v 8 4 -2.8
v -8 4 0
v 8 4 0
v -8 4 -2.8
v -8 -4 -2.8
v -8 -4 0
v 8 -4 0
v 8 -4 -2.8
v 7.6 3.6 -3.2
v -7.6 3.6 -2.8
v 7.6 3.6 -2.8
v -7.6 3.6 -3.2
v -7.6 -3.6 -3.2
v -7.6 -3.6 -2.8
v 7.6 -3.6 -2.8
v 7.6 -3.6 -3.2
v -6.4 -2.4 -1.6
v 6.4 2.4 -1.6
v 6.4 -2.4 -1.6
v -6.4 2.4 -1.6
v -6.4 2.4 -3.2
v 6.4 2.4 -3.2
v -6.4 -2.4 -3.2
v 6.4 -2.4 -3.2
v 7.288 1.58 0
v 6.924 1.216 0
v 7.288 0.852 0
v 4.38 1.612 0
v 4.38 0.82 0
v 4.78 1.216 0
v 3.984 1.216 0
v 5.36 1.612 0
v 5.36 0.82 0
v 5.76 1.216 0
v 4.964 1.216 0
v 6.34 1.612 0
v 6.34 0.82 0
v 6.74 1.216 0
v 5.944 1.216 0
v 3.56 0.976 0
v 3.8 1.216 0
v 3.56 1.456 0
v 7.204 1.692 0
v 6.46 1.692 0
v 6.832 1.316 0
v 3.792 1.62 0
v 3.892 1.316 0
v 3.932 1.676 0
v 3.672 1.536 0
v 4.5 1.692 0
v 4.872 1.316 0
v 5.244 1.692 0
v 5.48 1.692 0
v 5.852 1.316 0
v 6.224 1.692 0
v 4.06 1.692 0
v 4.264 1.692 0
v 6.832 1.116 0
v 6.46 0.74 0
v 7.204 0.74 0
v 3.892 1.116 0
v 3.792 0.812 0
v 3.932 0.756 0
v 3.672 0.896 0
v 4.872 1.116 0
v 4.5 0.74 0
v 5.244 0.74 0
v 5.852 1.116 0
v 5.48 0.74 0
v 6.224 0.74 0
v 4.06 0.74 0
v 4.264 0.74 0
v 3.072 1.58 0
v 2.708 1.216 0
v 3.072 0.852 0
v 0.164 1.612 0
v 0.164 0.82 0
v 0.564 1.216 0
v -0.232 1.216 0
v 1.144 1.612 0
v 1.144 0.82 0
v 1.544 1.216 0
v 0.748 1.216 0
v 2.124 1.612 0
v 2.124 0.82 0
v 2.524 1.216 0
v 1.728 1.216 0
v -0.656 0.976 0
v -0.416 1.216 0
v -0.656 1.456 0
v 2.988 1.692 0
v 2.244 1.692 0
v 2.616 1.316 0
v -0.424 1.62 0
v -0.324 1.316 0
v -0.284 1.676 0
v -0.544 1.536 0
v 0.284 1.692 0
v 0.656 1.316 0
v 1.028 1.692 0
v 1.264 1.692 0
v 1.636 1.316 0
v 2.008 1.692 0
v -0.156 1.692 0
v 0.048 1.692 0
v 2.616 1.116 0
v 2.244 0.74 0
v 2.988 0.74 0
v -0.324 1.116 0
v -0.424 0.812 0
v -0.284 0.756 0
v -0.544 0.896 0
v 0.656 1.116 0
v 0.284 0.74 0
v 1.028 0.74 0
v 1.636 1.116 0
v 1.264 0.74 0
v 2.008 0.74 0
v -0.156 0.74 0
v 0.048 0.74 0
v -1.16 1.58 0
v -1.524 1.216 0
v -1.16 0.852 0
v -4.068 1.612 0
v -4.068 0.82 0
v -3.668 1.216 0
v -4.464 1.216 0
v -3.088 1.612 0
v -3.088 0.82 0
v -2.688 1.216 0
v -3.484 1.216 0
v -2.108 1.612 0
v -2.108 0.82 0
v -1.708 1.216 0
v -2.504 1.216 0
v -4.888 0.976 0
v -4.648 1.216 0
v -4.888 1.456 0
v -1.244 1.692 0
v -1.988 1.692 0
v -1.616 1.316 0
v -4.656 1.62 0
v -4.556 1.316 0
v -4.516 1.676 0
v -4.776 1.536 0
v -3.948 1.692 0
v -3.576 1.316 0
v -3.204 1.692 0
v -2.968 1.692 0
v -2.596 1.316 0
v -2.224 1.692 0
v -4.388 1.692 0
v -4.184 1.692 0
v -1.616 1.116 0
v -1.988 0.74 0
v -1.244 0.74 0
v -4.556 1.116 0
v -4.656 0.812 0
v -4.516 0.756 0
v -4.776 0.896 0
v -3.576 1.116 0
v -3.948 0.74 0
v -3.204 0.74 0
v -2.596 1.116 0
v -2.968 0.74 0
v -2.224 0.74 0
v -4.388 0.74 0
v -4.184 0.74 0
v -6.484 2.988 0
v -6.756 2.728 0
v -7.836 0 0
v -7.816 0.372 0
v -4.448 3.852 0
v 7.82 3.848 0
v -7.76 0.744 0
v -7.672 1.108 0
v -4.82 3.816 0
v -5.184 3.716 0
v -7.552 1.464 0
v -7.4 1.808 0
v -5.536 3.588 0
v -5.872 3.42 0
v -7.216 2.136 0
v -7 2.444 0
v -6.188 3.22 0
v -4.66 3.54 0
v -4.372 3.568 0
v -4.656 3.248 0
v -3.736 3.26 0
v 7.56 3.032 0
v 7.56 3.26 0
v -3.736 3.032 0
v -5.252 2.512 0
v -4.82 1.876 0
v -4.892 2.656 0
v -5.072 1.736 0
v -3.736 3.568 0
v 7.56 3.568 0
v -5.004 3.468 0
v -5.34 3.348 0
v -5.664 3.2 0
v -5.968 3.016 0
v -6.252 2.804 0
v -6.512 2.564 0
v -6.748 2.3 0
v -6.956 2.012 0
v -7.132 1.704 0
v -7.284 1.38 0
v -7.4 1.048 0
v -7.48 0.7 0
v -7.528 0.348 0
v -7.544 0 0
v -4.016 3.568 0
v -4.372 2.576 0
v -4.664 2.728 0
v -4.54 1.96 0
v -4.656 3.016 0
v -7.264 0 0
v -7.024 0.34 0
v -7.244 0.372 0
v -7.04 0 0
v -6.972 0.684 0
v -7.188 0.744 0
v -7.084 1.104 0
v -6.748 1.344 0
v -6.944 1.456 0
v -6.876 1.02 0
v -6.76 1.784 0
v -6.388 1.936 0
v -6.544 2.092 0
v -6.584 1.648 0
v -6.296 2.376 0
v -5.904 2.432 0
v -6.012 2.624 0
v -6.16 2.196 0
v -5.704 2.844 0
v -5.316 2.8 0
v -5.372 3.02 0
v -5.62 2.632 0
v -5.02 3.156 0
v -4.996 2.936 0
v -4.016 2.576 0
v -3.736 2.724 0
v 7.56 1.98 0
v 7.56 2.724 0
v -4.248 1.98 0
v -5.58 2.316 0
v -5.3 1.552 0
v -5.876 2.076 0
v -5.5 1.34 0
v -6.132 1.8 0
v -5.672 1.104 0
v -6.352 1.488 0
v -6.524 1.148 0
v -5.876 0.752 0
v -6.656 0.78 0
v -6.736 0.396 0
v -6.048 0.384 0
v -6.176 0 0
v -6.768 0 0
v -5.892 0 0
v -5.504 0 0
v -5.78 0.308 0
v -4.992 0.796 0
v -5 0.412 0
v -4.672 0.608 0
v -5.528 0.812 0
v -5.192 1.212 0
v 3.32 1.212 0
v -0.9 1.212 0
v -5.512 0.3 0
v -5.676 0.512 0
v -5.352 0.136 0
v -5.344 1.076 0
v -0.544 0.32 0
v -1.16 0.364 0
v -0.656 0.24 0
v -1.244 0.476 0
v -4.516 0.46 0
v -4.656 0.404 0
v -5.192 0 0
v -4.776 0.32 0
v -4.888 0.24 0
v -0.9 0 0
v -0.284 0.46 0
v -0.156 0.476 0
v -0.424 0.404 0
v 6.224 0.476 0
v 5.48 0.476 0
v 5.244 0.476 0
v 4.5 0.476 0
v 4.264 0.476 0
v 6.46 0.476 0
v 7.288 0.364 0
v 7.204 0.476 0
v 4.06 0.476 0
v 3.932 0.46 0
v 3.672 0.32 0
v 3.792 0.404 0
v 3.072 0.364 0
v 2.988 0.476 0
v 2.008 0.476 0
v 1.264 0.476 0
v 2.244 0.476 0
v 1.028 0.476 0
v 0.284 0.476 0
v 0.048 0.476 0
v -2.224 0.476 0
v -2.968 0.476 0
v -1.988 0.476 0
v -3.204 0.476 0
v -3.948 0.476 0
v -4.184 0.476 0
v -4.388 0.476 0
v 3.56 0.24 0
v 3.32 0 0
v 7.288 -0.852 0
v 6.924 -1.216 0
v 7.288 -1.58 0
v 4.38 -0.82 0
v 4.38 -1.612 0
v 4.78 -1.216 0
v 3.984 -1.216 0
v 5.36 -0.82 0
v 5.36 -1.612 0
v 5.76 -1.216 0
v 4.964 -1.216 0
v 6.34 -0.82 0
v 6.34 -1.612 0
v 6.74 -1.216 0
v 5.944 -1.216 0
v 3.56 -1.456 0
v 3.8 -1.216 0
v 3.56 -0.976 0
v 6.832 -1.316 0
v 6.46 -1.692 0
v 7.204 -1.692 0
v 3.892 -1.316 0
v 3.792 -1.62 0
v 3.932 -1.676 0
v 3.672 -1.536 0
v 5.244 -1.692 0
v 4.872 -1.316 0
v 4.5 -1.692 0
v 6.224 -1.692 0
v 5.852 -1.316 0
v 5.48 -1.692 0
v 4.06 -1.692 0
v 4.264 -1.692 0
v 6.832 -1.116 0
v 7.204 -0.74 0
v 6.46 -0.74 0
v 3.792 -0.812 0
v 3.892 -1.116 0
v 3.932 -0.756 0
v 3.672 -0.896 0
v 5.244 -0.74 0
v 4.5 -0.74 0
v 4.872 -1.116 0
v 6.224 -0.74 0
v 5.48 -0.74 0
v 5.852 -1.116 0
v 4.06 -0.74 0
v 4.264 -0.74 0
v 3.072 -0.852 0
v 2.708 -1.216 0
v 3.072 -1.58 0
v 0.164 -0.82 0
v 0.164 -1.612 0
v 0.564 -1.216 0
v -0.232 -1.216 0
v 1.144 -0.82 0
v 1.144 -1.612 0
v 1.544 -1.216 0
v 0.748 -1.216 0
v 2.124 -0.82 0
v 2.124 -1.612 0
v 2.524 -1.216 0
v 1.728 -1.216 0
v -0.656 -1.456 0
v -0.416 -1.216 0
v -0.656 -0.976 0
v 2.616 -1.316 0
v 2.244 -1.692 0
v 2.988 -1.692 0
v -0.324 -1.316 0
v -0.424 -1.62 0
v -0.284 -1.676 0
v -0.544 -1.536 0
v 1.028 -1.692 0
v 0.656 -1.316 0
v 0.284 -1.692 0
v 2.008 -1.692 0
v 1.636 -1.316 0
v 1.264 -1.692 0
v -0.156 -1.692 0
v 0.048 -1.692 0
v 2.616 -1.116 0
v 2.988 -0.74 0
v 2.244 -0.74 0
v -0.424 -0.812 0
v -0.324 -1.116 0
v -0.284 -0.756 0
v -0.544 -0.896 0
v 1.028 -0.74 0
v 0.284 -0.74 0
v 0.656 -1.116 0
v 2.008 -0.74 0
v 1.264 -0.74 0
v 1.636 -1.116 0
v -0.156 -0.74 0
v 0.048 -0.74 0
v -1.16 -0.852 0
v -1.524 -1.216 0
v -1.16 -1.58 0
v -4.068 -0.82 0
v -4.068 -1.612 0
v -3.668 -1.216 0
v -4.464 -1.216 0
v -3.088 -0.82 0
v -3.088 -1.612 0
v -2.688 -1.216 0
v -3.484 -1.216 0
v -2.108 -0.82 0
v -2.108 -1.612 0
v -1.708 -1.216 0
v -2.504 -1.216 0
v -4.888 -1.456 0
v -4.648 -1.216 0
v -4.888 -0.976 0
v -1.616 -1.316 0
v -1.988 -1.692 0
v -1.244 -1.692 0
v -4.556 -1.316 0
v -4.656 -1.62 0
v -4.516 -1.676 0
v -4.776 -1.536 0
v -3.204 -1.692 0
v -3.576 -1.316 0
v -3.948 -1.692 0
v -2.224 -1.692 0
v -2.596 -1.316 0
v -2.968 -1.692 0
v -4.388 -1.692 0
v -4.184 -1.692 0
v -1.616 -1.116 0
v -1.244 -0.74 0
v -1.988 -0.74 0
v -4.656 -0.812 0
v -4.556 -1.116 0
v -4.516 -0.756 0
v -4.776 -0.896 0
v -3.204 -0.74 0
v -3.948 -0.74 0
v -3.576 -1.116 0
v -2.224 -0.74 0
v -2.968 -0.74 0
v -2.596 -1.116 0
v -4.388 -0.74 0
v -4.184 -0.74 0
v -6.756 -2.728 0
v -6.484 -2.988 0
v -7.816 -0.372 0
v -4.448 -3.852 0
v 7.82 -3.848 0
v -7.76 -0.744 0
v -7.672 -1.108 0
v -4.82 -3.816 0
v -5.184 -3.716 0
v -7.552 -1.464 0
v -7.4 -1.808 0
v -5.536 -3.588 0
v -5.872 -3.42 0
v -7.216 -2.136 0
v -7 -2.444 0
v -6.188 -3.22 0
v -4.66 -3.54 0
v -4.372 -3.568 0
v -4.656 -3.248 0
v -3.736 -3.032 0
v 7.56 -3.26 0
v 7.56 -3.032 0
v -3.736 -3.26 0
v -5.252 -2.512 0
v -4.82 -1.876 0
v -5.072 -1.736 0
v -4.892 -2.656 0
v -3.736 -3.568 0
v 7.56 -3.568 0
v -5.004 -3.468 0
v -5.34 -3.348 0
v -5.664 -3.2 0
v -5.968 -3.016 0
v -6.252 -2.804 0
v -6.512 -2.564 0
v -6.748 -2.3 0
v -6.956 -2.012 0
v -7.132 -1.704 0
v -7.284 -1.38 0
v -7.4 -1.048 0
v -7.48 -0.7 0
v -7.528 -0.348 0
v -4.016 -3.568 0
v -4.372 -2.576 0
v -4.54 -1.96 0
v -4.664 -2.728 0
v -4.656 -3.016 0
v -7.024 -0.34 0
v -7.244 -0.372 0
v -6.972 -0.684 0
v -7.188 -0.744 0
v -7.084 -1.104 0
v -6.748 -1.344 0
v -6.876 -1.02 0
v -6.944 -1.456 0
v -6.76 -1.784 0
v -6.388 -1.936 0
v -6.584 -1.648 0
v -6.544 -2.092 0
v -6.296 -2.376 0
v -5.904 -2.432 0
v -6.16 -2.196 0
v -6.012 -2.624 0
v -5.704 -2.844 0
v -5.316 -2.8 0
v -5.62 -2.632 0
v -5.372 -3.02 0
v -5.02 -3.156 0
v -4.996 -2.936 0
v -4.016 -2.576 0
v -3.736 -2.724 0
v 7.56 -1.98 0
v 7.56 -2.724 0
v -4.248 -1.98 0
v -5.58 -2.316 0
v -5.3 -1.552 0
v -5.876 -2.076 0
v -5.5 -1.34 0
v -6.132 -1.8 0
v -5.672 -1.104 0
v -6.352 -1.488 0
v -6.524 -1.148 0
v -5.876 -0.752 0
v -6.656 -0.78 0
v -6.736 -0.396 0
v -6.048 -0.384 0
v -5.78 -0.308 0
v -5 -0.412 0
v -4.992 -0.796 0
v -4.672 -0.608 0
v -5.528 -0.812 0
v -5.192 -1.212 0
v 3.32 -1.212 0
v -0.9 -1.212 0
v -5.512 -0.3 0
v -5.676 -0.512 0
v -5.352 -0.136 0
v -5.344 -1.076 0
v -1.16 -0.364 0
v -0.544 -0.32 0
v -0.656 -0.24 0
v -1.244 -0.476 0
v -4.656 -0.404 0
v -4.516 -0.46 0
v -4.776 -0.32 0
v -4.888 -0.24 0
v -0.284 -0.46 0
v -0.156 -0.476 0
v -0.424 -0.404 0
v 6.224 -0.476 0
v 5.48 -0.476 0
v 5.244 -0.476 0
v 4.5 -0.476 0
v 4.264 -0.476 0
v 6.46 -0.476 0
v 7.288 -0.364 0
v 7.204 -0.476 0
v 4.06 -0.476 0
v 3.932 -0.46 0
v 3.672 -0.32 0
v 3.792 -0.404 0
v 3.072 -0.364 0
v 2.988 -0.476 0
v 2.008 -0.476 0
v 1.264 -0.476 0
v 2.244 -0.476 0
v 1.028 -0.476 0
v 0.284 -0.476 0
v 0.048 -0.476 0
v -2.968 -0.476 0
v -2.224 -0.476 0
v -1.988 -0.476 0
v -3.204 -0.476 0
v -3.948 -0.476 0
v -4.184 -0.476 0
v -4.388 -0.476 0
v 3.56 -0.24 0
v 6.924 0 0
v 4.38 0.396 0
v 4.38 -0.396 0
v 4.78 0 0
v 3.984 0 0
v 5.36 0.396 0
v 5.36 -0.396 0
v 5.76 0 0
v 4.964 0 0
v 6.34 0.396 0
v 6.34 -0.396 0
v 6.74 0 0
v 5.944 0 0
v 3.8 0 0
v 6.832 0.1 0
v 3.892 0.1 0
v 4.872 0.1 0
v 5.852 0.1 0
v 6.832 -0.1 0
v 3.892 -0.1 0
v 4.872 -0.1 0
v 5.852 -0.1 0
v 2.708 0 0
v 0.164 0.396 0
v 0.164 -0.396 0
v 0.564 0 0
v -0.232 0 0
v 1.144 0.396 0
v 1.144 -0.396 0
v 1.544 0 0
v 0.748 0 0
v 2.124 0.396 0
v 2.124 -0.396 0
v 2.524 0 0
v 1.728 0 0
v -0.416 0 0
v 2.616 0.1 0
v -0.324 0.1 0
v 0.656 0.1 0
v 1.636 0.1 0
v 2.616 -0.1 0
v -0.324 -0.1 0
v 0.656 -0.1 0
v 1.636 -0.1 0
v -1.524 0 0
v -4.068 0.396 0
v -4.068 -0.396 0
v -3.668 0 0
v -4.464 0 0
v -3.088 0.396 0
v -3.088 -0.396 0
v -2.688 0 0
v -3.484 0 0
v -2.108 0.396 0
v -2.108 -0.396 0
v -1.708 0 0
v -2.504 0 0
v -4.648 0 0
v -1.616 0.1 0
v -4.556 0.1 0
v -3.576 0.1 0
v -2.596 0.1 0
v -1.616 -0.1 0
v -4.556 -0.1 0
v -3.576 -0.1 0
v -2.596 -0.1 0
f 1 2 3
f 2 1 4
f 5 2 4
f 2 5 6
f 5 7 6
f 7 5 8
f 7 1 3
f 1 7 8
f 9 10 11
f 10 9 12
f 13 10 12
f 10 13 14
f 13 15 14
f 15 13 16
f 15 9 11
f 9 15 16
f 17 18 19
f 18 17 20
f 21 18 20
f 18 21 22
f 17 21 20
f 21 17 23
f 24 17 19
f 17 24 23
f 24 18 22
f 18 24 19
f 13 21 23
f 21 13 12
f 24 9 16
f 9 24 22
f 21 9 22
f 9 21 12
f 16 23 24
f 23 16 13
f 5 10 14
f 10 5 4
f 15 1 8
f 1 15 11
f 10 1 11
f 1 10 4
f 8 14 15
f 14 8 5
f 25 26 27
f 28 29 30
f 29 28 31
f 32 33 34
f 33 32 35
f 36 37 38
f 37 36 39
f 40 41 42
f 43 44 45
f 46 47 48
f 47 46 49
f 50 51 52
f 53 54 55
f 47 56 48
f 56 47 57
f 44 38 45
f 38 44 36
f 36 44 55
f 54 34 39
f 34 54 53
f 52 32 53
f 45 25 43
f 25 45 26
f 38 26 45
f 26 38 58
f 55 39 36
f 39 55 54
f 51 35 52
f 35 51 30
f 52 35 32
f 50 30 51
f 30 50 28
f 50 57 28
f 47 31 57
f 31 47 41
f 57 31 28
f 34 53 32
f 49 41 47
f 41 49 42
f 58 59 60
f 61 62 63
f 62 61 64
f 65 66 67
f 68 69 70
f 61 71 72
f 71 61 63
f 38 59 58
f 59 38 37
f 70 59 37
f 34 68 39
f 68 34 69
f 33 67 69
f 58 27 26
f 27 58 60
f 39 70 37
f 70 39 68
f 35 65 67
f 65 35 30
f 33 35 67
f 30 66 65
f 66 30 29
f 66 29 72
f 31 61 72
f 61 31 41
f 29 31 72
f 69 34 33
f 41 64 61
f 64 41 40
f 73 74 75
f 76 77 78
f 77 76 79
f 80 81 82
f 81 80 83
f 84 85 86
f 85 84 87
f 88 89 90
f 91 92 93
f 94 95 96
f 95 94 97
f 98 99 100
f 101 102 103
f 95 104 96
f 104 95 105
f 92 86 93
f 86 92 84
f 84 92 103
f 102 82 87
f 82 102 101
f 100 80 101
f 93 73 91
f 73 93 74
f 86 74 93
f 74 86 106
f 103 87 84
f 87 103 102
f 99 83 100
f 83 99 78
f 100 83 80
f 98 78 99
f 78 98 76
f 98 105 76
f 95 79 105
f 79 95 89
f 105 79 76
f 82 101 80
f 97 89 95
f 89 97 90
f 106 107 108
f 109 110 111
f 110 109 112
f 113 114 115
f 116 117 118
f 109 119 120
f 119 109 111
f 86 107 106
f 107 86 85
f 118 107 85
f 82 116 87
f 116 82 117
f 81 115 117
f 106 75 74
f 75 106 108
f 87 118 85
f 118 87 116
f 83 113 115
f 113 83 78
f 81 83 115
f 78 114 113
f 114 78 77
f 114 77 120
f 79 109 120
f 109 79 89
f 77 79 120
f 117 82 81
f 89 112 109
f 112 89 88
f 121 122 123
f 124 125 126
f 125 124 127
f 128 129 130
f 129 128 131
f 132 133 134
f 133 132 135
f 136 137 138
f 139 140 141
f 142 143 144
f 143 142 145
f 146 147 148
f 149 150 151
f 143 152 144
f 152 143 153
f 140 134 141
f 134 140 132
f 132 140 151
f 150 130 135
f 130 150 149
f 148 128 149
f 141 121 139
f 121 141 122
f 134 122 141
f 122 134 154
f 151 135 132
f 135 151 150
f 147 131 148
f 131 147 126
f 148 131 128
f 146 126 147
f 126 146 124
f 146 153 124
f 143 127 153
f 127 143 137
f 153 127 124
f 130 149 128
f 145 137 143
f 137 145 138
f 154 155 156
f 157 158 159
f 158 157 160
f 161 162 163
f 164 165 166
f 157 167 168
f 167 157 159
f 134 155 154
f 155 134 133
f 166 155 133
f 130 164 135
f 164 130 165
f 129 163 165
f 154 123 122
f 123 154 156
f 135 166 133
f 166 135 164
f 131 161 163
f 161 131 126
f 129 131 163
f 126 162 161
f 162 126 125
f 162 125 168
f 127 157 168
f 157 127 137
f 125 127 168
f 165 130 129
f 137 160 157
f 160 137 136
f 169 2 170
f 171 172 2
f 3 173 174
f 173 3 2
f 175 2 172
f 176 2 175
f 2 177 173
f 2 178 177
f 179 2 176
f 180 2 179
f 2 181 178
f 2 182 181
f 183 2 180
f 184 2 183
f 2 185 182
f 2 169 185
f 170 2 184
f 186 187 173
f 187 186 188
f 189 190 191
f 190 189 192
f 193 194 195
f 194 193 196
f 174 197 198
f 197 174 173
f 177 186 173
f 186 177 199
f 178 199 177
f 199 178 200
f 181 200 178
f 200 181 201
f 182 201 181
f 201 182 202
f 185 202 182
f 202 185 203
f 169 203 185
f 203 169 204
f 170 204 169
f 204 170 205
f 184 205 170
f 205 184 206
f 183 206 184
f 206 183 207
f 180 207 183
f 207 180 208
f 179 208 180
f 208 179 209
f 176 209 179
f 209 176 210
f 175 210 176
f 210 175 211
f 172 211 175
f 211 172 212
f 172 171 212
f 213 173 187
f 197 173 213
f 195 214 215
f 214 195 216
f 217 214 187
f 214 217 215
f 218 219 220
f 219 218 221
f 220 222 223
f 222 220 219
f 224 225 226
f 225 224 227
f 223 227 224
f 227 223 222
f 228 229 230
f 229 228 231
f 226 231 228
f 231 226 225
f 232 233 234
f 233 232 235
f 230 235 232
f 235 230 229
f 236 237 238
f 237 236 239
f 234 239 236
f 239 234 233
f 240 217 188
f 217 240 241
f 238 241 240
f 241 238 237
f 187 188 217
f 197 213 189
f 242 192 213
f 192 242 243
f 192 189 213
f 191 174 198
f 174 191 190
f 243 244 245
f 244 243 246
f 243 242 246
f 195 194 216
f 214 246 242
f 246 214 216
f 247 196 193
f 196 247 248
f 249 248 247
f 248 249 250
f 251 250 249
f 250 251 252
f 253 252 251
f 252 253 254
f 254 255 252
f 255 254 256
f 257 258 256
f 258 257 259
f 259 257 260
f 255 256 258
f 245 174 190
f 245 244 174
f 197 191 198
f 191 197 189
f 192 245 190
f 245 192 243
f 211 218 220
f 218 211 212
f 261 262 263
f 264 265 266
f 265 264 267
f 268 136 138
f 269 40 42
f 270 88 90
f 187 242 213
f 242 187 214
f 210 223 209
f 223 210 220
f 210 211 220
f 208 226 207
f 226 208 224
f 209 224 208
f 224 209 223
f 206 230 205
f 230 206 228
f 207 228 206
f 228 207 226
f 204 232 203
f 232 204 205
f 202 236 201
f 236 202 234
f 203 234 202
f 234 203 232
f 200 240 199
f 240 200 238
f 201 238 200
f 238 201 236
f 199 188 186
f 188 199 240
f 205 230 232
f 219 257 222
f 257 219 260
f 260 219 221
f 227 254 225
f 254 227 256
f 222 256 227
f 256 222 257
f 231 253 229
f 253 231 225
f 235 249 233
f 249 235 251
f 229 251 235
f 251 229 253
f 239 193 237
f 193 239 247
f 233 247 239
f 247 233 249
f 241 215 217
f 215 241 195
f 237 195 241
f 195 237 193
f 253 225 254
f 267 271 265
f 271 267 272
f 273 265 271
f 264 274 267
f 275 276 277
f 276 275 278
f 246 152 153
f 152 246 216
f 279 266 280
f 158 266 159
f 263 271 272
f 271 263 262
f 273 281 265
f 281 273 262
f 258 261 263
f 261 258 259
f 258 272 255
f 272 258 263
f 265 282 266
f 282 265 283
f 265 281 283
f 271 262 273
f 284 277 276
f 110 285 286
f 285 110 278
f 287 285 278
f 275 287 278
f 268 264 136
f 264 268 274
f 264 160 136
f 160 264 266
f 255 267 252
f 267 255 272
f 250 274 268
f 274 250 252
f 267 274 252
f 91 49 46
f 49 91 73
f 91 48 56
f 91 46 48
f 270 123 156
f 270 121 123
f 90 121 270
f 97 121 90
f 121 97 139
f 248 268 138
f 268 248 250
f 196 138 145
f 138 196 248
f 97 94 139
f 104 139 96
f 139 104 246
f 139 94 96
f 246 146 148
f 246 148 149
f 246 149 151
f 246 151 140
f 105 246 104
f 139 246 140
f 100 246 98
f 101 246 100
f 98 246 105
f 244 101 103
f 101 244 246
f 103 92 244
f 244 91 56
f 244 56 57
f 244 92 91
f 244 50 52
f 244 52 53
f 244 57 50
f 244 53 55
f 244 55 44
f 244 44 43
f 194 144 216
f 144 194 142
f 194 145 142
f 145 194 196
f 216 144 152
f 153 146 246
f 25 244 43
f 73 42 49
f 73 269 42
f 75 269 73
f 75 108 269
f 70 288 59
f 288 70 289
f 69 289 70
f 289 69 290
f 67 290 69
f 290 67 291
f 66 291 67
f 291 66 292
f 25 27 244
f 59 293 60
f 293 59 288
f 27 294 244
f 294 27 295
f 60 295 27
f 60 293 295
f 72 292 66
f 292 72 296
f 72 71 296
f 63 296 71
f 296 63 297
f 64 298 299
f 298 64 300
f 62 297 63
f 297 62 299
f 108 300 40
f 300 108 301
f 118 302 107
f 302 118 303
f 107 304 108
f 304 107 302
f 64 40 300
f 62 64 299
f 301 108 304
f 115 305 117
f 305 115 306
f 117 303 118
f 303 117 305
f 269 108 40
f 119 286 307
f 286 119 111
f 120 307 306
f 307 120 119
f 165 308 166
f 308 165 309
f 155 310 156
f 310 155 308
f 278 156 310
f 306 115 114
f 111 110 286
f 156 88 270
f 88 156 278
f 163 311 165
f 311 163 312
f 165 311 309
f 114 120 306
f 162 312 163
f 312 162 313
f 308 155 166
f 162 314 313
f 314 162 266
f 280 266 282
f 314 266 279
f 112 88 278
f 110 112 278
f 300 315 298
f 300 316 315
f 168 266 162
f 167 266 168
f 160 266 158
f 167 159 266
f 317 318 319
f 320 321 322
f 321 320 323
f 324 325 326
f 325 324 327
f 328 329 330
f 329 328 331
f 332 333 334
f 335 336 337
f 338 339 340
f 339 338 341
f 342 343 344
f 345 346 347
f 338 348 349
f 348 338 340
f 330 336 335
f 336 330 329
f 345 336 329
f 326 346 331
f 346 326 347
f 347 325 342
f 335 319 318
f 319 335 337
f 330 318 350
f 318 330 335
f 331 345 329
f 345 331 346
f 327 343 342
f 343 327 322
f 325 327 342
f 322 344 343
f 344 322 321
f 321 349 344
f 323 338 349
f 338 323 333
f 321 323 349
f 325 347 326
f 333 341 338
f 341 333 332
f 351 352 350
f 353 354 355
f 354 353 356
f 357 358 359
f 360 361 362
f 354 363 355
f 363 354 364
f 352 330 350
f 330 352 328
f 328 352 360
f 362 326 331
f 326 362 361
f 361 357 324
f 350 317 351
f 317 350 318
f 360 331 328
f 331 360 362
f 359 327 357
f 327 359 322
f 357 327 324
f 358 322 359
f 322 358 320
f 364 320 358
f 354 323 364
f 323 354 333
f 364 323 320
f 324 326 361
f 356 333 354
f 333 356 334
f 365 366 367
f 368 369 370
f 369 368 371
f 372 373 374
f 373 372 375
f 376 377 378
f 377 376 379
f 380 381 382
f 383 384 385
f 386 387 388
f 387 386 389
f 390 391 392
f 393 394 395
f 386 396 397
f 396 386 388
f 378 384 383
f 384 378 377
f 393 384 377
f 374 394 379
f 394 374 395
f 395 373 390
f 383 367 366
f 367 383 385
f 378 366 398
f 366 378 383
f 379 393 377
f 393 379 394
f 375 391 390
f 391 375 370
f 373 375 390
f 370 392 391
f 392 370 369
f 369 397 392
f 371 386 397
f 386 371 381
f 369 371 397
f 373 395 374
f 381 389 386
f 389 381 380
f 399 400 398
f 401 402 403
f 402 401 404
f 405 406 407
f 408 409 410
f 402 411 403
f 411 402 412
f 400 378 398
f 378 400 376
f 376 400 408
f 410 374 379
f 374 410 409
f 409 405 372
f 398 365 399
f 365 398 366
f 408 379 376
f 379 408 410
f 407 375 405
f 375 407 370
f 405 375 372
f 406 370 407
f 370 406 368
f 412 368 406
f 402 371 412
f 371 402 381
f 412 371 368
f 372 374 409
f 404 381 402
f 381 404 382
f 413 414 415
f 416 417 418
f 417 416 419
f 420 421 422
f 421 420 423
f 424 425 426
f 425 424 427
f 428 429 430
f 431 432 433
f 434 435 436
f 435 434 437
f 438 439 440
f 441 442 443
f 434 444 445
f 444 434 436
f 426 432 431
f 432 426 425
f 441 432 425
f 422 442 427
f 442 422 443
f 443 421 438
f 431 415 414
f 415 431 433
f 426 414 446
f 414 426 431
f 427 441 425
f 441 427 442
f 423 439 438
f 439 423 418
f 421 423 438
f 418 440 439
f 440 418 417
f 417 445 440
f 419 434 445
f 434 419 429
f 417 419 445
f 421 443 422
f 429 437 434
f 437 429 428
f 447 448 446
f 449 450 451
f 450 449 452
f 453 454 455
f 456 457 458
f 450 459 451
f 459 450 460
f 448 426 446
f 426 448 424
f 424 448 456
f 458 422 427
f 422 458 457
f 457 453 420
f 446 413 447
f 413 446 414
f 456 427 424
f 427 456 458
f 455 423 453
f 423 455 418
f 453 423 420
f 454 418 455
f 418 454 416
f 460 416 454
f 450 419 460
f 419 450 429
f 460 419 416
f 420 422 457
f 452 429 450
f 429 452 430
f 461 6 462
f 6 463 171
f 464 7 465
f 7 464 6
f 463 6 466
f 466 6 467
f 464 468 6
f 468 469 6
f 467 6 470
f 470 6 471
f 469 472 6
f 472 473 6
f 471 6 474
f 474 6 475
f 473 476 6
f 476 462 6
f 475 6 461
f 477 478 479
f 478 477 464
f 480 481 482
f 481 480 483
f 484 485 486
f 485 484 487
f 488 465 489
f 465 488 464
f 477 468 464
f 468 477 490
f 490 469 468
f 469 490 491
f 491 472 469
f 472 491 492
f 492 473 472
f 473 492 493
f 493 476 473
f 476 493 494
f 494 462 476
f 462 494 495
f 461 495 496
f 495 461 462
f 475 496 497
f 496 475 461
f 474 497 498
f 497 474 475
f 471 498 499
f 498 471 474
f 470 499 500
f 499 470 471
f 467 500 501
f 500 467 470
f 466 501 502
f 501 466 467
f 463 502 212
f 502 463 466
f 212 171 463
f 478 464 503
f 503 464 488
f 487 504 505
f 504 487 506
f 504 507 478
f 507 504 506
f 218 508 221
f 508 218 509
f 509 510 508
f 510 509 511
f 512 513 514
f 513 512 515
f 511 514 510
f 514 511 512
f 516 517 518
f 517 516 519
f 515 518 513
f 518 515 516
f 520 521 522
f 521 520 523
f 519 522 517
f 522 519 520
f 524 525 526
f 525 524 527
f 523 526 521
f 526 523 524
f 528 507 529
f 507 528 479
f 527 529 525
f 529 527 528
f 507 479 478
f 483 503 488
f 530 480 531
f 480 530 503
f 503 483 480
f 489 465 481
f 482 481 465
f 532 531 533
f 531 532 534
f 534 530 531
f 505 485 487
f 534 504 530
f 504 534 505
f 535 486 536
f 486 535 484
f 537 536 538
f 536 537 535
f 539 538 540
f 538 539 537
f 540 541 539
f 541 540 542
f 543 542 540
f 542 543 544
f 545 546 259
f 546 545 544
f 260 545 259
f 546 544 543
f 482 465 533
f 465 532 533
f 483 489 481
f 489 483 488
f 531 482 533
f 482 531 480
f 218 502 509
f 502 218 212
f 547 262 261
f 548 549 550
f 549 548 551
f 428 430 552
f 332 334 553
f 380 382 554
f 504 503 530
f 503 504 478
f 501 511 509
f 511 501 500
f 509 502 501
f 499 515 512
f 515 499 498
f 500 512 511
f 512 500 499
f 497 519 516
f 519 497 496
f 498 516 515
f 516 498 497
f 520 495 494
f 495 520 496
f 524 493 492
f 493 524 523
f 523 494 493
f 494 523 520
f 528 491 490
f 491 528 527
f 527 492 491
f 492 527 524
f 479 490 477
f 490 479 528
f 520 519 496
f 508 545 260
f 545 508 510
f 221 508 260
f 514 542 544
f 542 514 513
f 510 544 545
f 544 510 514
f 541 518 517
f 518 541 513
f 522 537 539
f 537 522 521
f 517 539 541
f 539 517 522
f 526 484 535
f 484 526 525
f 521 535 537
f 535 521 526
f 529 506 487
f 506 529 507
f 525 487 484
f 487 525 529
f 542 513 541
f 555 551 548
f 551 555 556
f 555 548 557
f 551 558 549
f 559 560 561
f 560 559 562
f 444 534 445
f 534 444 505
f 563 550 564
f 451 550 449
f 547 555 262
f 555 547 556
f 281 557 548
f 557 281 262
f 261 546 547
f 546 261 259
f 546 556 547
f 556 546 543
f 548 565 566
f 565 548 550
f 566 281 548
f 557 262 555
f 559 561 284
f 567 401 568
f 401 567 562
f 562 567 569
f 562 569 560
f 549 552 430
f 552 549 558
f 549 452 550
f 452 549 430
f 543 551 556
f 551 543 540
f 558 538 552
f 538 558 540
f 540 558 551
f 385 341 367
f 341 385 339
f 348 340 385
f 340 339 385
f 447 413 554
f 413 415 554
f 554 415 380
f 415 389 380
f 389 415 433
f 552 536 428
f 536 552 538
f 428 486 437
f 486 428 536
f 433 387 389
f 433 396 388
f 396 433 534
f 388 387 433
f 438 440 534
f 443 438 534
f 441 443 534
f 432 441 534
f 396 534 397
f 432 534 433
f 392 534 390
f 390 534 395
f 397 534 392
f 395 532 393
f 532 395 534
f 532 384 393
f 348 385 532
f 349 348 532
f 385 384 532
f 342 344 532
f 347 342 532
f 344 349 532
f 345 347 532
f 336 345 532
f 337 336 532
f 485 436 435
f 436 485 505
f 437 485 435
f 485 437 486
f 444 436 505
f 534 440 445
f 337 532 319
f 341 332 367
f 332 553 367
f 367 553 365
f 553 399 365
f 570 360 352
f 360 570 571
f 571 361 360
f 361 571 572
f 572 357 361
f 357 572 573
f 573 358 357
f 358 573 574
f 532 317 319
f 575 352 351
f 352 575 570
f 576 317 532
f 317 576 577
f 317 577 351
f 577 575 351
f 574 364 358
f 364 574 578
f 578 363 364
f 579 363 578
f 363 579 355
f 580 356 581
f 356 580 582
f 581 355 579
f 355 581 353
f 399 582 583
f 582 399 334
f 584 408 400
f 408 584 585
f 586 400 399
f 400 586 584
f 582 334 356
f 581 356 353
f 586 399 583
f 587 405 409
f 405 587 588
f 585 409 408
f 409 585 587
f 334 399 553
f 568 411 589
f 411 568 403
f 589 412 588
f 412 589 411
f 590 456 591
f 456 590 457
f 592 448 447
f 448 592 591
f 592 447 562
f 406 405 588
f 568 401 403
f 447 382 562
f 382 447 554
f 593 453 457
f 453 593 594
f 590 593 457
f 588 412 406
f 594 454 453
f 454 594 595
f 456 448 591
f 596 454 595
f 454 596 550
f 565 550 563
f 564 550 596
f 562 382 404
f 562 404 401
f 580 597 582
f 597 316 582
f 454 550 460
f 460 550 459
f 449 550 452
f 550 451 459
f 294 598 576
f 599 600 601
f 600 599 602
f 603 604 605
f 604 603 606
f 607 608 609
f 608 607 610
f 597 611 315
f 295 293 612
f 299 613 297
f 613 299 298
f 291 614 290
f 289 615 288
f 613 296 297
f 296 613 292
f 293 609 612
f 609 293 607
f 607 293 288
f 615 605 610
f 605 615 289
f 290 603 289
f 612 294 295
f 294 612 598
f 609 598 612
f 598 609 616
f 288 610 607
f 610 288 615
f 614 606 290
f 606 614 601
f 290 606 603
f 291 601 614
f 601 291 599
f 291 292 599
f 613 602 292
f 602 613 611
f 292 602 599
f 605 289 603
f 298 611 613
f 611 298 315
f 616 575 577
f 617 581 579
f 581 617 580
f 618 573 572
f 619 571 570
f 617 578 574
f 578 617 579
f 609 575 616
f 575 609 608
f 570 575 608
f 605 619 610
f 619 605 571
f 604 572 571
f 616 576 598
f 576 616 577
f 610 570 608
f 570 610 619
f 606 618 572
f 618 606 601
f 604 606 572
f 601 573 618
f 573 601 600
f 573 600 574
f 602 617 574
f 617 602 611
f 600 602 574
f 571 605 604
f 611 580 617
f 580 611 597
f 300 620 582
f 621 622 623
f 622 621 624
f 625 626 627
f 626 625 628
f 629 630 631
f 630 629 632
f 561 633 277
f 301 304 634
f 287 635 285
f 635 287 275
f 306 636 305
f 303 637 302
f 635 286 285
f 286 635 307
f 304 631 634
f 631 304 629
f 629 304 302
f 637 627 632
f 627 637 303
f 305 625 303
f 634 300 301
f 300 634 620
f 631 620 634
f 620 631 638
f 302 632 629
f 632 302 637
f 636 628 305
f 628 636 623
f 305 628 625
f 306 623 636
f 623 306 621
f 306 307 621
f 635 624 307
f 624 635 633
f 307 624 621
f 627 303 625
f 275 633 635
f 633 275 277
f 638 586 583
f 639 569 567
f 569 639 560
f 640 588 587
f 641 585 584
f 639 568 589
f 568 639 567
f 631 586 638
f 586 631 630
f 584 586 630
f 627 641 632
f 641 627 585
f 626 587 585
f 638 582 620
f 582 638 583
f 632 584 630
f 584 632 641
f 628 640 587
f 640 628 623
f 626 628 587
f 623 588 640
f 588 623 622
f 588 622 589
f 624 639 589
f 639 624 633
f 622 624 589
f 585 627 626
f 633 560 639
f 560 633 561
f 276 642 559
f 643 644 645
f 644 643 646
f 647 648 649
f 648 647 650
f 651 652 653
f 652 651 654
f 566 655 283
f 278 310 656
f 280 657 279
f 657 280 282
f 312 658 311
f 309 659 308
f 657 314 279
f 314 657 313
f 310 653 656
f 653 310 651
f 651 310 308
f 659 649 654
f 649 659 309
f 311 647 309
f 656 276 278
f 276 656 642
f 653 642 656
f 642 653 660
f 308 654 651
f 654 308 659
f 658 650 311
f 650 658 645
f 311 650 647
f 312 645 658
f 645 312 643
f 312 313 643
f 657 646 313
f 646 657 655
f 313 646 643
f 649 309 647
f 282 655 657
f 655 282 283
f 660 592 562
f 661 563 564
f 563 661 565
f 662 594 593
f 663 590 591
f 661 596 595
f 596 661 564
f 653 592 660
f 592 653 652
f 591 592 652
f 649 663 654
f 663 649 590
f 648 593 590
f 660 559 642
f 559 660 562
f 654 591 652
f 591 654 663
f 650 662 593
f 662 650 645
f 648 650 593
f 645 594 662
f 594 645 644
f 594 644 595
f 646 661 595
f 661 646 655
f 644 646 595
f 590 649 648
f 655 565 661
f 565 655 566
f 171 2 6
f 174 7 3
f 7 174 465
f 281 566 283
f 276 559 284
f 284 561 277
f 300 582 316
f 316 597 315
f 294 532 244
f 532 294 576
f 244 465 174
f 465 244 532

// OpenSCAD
// file: ../p/box5.scad
use <../lib.scad>
function ldraw_lib__box5() = [
// 0 Box with 5 Faces and All Edges
// 0 Name: box5.dat
// 0 Author: James Jessiman
// 0 !LDRAW_ORG Primitive UPDATE 2012-01
// 0 !LICENSE Licensed under CC BY 4.0 : see CAreadme.txt
// 
// 0 BFC CERTIFY CCW
  [0,"BFC","CERTIFY"],
  [0,"BFC","CCW"],
// 
// 0 !HISTORY 2002-04-03 [sbliss] Modified for BFC compliance
// 0 !HISTORY 2002-04-25 [PTadmin] Official Update 2002-02
// 0 !HISTORY 2007-06-24 [PTadmin] Header formatted for Contributor Agreement
// 0 !HISTORY 2008-07-01 [PTadmin] Official Update 2008-01
// 0 !HISTORY 2012-02-16 [Philo] Changed to CCW
// 0 !HISTORY 2012-03-30 [PTadmin] Official Update 2012-01
// 
// 
// 2 24 1 1 1 -1 1 1
  [2,24,1,1,1,-1,1,1],
// 2 24 -1 1 1 -1 1 -1
  [2,24,-1,1,1,-1,1,-1],
// 2 24 -1 1 -1 1 1 -1
  [2,24,-1,1,-1,1,1,-1],
// 2 24 1 1 -1 1 1 1
  [2,24,1,1,-1,1,1,1],
// 2 24 1 0 1 -1 0 1
  [2,24,1,0,1,-1,0,1],
// 2 24 -1 0 1 -1 0 -1
  [2,24,-1,0,1,-1,0,-1],
// 2 24 -1 0 -1 1 0 -1
  [2,24,-1,0,-1,1,0,-1],
// 2 24 1 0 -1 1 0 1
  [2,24,1,0,-1,1,0,1],
// 2 24 1 0 1 1 1 1
  [2,24,1,0,1,1,1,1],
// 2 24 -1 0 1 -1 1 1
  [2,24,-1,0,1,-1,1,1],
// 2 24 1 0 -1 1 1 -1
  [2,24,1,0,-1,1,1,-1],
// 2 24 -1 0 -1 -1 1 -1
  [2,24,-1,0,-1,-1,1,-1],
// 4 16 -1 1 1 1 1 1 1 1 -1 -1 1 -1
  [4,16,-1,1,1,1,1,1,1,1,-1,-1,1,-1],
// 4 16 -1 1 1 -1 0 1 1 0 1 1 1 1
  [4,16,-1,1,1,-1,0,1,1,0,1,1,1,1],
// 4 16 -1 1 -1 -1 0 -1 -1 0 1 -1 1 1
  [4,16,-1,1,-1,-1,0,-1,-1,0,1,-1,1,1],
// 4 16 1 1 -1 1 0 -1 -1 0 -1 -1 1 -1
  [4,16,1,1,-1,1,0,-1,-1,0,-1,-1,1,-1],
// 4 16 1 1 1 1 0 1 1 0 -1 1 1 -1
  [4,16,1,1,1,1,0,1,1,0,-1,1,1,-1],
];
module ldraw_lib__box5(step=0, col=false, unit=2/5, alt=false, line=0.2, solid=!$preview)
    makepoly(ldraw_lib__box5(), step=step, col=col, unit=unit, alt=alt, line=line, solid=solid);
ldraw_lib__box5(line=0.2);
// file: ../p/box4.scad
use <../lib.scad>
function ldraw_lib__box4() = [
// 0 Box with 4 Faces (2 Parallel Pairs) and All Edges
// 0 Name: box4.dat
// 0 Author: James Jessiman
// 0 !LDRAW_ORG Primitive UPDATE 2012-01
// 0 !LICENSE Licensed under CC BY 4.0 : see CAreadme.txt
// 
// 0 BFC CERTIFY CCW
  [0,"BFC","CERTIFY"],
  [0,"BFC","CCW"],
// 
// 0 !HISTORY 2002-04-03 [sbliss] Modified for BFC compliance
// 0 !HISTORY 2002-04-25 [PTadmin] Official Update 2002-02
// 0 !HISTORY 2007-06-24 [PTadmin] Header formatted for Contributor Agreement
// 0 !HISTORY 2008-07-01 [PTadmin] Official Update 2008-01
// 0 !HISTORY 2012-02-16 [Philo] Changed to CCW
// 0 !HISTORY 2012-03-30 [PTadmin] Official Update 2012-01
// 
// 
// 2 24 1 1 1 -1 1 1
  [2,24,1,1,1,-1,1,1],
// 2 24 -1 1 1 -1 1 -1
  [2,24,-1,1,1,-1,1,-1],
// 2 24 -1 1 -1 1 1 -1
  [2,24,-1,1,-1,1,1,-1],
// 2 24 1 1 -1 1 1 1
  [2,24,1,1,-1,1,1,1],
// 2 24 1 0 1 -1 0 1
  [2,24,1,0,1,-1,0,1],
// 2 24 -1 0 1 -1 0 -1
  [2,24,-1,0,1,-1,0,-1],
// 2 24 -1 0 -1 1 0 -1
  [2,24,-1,0,-1,1,0,-1],
// 2 24 1 0 -1 1 0 1
  [2,24,1,0,-1,1,0,1],
// 2 24 1 0 1 1 1 1
  [2,24,1,0,1,1,1,1],
// 2 24 -1 0 1 -1 1 1
  [2,24,-1,0,1,-1,1,1],
// 2 24 1 0 -1 1 1 -1
  [2,24,1,0,-1,1,1,-1],
// 2 24 -1 0 -1 -1 1 -1
  [2,24,-1,0,-1,-1,1,-1],
// 4 16 -1 1 1 -1 0 1 1 0 1 1 1 1
  [4,16,-1,1,1,-1,0,1,1,0,1,1,1,1],
// 4 16 -1 1 -1 -1 0 -1 -1 0 1 -1 1 1
  [4,16,-1,1,-1,-1,0,-1,-1,0,1,-1,1,1],
// 4 16 1 1 -1 1 0 -1 -1 0 -1 -1 1 -1
  [4,16,1,1,-1,1,0,-1,-1,0,-1,-1,1,-1],
// 4 16 1 1 1 1 0 1 1 0 -1 1 1 -1
  [4,16,1,1,1,1,0,1,1,0,-1,1,1,-1],
];
module ldraw_lib__box4(step=0, col=false, unit=2/5, alt=false, line=0.2, solid=!$preview)
    makepoly(ldraw_lib__box4(), step=step, col=col, unit=unit, alt=alt, line=line, solid=solid);
ldraw_lib__box4(line=0.2);
// file: s/3069bs01.scad
use <../../lib.scad>
use <../../p/box4.scad>
use <../../p/box5.scad>
function ldraw_lib__s__3069bs01() = [
// 0 ~Tile  1 x  2 with Groove without Top Face
// 0 Name: s\3069bs01.dat
// 0 Author: Santeri Piippo [arezey]
// 0 !LDRAW_ORG Subpart UPDATE 2010-02
// 0 !LICENSE Licensed under CC BY 4.0 : see CAreadme.txt
// 
// 0 BFC CERTIFY CCW
  [0,"BFC","CERTIFY"],
  [0,"BFC","CCW"],
// 
// 0 !HISTORY 2010-07-05 [PTadmin] Official Update 2010-02
// 
// 
// 1 16 0 0 0 20 0 0 0 7 0 0 0 10 box4.dat
  [1,16,0,0,0,20,0,0,0,7,0,0,0,10, ldraw_lib__box4()],
// 1 16 0 7 0 19 0 0 0 1 0 0 0 9 box4.dat
  [1,16,0,7,0,19,0,0,0,1,0,0,0,9, ldraw_lib__box4()],
// 0 BFC INVERTNEXT
  [0,"BFC","INVERTNEXT"],
// 1 16 0 8 0 16 0 0 0 -4 0 0 0 6 box5.dat
  [1,16,0,8,0,16,0,0,0,-4,0,0,0,6, ldraw_lib__box5()],
// 4 16 -19 8 9 -16 8 6 -16 8 -6 -19 8 -9
  [4,16,-19,8,9,-16,8,6,-16,8,-6,-19,8,-9],
// 4 16 19 8 -9 16 8 -6 16 8 6 19 8 9
  [4,16,19,8,-9,16,8,-6,16,8,6,19,8,9],
// 4 16 19 8 9 16 8 6 -16 8 6 -19 8 9
  [4,16,19,8,9,16,8,6,-16,8,6,-19,8,9],
// 4 16 -19 8 -9 -16 8 -6 16 8 -6 19 8 -9
  [4,16,-19,8,-9,-16,8,-6,16,8,-6,19,8,-9],
// 4 16 -20 7 10 -19 7 9 -19 7 -9 -20 7 -10
  [4,16,-20,7,10,-19,7,9,-19,7,-9,-20,7,-10],
// 4 16 20 7 -10 19 7 -9 19 7 9 20 7 10
  [4,16,20,7,-10,19,7,-9,19,7,9,20,7,10],
// 4 16 20 7 10 19 7 9 -19 7 9 -20 7 10
  [4,16,20,7,10,19,7,9,-19,7,9,-20,7,10],
// 4 16 -20 7 -10 -19 7 -9 19 7 -9 20 7 -10
  [4,16,-20,7,-10,-19,7,-9,19,7,-9,20,7,-10],
// 0 //
];
module ldraw_lib__s__3069bs01(step=0, col=false, unit=2/5, alt=false, line=0.2, solid=!$preview)
    makepoly(ldraw_lib__s__3069bs01(), step=step, col=col, unit=unit, alt=alt, line=line, solid=solid);
ldraw_lib__s__3069bs01(line=0.2);
// file: s/3069bp1fs01.scad
use <../../lib.scad>
function ldraw_lib__s__3069bp1fs01() = [
// 0 ~Tile  1 x  2 Silver Window with Dark Brown Lattice Pattern
// 0 Name: s\3069bp1fs01.dat
// 0 Author: Philippe Hurbain [Philo]
// 0 !LDRAW_ORG Subpart UPDATE 2025-07
// 0 !LICENSE Licensed under CC BY 4.0 : see CAreadme.txt
// 
// 0 BFC CERTIFY CCW
  [0,"BFC","CERTIFY"],
  [0,"BFC","CCW"],
// 
// 0 !HISTORY 2025-07-27 [OrionP] Official Update 2025-07
// 
// 3 80 18.22 0 0.91 17.31 0 0 18.22 0 -0.91
  [3,80,18.22,0,0.91,17.31,0,0,18.22,0,-0.91],
// 4 80 10.95 0 .99 9.96 0 0 10.95 0 -.99 11.95 0 0
  [4,80,10.95,0,.99,9.96,0,0,10.95,0,-.99,11.95,0,0],
// 4 80 13.4 0 .99 12.41 0 0 13.4 0 -.99 14.4 0 0
  [4,80,13.4,0,.99,12.41,0,0,13.4,0,-.99,14.4,0,0],
// 4 80 15.85 0 .99 14.86 0 0 15.85 0 -.99 16.85 0 0
  [4,80,15.85,0,.99,14.86,0,0,15.85,0,-.99,16.85,0,0],
// 3 80 8.9 0 -0.6 9.5 0 0 8.9 0 0.6
  [3,80,8.9,0,-0.6,9.5,0,0,8.9,0,0.6],
// 3 80 18.01 0 1.19 16.15 0 1.19 17.08 0 0.25
  [3,80,18.01,0,1.19,16.15,0,1.19,17.08,0,0.25],
// 4 80 9.73 0 0.25 9.83 0 1.15 9.48 0 1.01 9.18 0 0.8
  [4,80,9.73,0,0.25,9.83,0,1.15,9.48,0,1.01,9.18,0,0.8],
// 3 80 11.25 0 1.19 12.18 0 0.25 13.11 0 1.19
  [3,80,11.25,0,1.19,12.18,0,0.25,13.11,0,1.19],
// 3 80 13.7 0 1.19 14.63 0 0.25 15.56 0 1.19
  [3,80,13.7,0,1.19,14.63,0,0.25,15.56,0,1.19],
// 4 80 9.73 0 0.25 10.66 0 1.19 10.15 0 1.19 9.83 0 1.15
  [4,80,9.73,0,0.25,10.66,0,1.19,10.15,0,1.19,9.83,0,1.15],
// 4 308 16.85 0 0 17.08 0 0.25 16.15 0 1.19 15.85 0 0.99
  [4,308,16.85,0,0,17.08,0,0.25,16.15,0,1.19,15.85,0,0.99],
// 3 308 15.85 0 0.99 16.15 0 1.19 15.56 0 1.19
  [3,308,15.85,0,0.99,16.15,0,1.19,15.56,0,1.19],
// 4 308 14.63 0 0.25 13.7 0 1.19 14.4 0 0 14.86 0 0
  [4,308,14.63,0,0.25,13.7,0,1.19,14.4,0,0,14.86,0,0],
// 3 308 13.11 0 1.19 13.4 0 0.99 13.7 0 1.19
  [3,308,13.11,0,1.19,13.4,0,0.99,13.7,0,1.19],
// 4 308 18.22 0 0.91 18.01 0 1.19 17.08 0 0.25 17.31 0 0
  [4,308,18.22,0,0.91,18.01,0,1.19,17.08,0,0.25,17.31,0,0],
// 4 308 17.31 0 0 17.08 0 0.25 16.85 0 0 17.08 0 -0.25
  [4,308,17.31,0,0,17.08,0,0.25,16.85,0,0,17.08,0,-0.25],
// 4 308 14.86 0 0 15.85 0 0.99 15.56 0 1.19 14.63 0 0.25
  [4,308,14.86,0,0,15.85,0,0.99,15.56,0,1.19,14.63,0,0.25],
// 4 308 12.18 0 0.25 11.95 0 0 12.41 0 0 13.11 0 1.19
  [4,308,12.18,0,0.25,11.95,0,0,12.41,0,0,13.11,0,1.19],
// 3 308 13.11 0 1.19 12.41 0 0 13.4 0 0.99
  [3,308,13.11,0,1.19,12.41,0,0,13.4,0,0.99],
// 4 308 11.95 0 0 12.18 0 0.25 11.25 0 1.19 10.95 0 0.99
  [4,308,11.95,0,0,12.18,0,0.25,11.25,0,1.19,10.95,0,0.99],
// 3 308 11.25 0 1.19 10.66 0 1.19 10.95 0 0.99
  [3,308,11.25,0,1.19,10.66,0,1.19,10.95,0,0.99],
// 4 308 9.73 0 0.25 9.5 0 0 9.96 0 0 10.66 0 1.19
  [4,308,9.73,0,0.25,9.5,0,0,9.96,0,0,10.66,0,1.19],
// 3 308 10.66 0 1.19 9.96 0 0 10.95 0 0.99
  [3,308,10.66,0,1.19,9.96,0,0,10.95,0,0.99],
// 3 308 14.4 0 0 13.7 0 1.19 13.4 0 0.99
  [3,308,14.4,0,0,13.7,0,1.19,13.4,0,0.99],
// 4 308 9.18 0 0.8 8.9 0 0.6 9.5 0 0 9.73 0 0.25
  [4,308,9.18,0,0.8,8.9,0,0.6,9.5,0,0,9.73,0,0.25],
// 3 80 17.08 0 -0.25 16.15 0 -1.19 18.01 0 -1.19
  [3,80,17.08,0,-0.25,16.15,0,-1.19,18.01,0,-1.19],
// 4 80 9.48 0 -1.01 9.83 0 -1.15 9.73 0 -0.25 9.18 0 -0.8
  [4,80,9.48,0,-1.01,9.83,0,-1.15,9.73,0,-0.25,9.18,0,-0.8],
// 3 80 12.18 0 -0.25 11.25 0 -1.19 13.11 0 -1.19
  [3,80,12.18,0,-0.25,11.25,0,-1.19,13.11,0,-1.19],
// 3 80 14.63 0 -0.25 13.7 0 -1.19 15.56 0 -1.19
  [3,80,14.63,0,-0.25,13.7,0,-1.19,15.56,0,-1.19],
// 4 80 10.15 0 -1.19 10.66 0 -1.19 9.73 0 -0.25 9.83 0 -1.15
  [4,80,10.15,0,-1.19,10.66,0,-1.19,9.73,0,-0.25,9.83,0,-1.15],
// 4 308 16.15 0 -1.19 17.08 0 -.25 16.85 0 0 15.85 0 -.99
  [4,308,16.15,0,-1.19,17.08,0,-.25,16.85,0,0,15.85,0,-.99],
// 3 308 15.56 0 -1.19 16.15 0 -1.19 15.85 0 -.99
  [3,308,15.56,0,-1.19,16.15,0,-1.19,15.85,0,-.99],
// 4 308 14.4 0 0 13.7 0 -1.19 14.63 0 -0.25 14.86 0 0
  [4,308,14.4,0,0,13.7,0,-1.19,14.63,0,-0.25,14.86,0,0],
// 3 308 13.4 0 -.99 13.11 0 -1.19 13.7 0 -1.19
  [3,308,13.4,0,-.99,13.11,0,-1.19,13.7,0,-1.19],
// 4 308 17.08 0 -0.25 18.01 0 -1.19 18.22 0 -0.91 17.31 0 0
  [4,308,17.08,0,-0.25,18.01,0,-1.19,18.22,0,-0.91,17.31,0,0],
// 4 308 15.56 0 -1.19 15.85 0 -.99 14.86 0 0 14.63 0 -.25
  [4,308,15.56,0,-1.19,15.85,0,-.99,14.86,0,0,14.63,0,-.25],
// 4 308 12.41 0 0 11.95 0 0 12.18 0 -0.25 13.11 0 -1.19
  [4,308,12.41,0,0,11.95,0,0,12.18,0,-0.25,13.11,0,-1.19],
// 3 308 13.4 0 -.99 12.41 0 0 13.11 0 -1.19
  [3,308,13.4,0,-.99,12.41,0,0,13.11,0,-1.19],
// 4 308 11.25 0 -1.19 12.18 0 -.25 11.95 0 0 10.95 0 -.99
  [4,308,11.25,0,-1.19,12.18,0,-.25,11.95,0,0,10.95,0,-.99],
// 3 308 11.25 0 -1.19 10.95 0 -.99 10.66 0 -1.19
  [3,308,11.25,0,-1.19,10.95,0,-.99,10.66,0,-1.19],
// 4 308 9.96 0 0 9.5 0 0 9.73 0 -0.25 10.66 0 -1.19
  [4,308,9.96,0,0,9.5,0,0,9.73,0,-0.25,10.66,0,-1.19],
// 3 308 10.95 0 -.99 9.96 0 0 10.66 0 -1.19
  [3,308,10.95,0,-.99,9.96,0,0,10.66,0,-1.19],
// 3 308 13.7 0 -1.19 14.4 0 0 13.4 0 -.99
  [3,308,13.7,0,-1.19,14.4,0,0,13.4,0,-.99],
// 4 308 9.5 0 0 8.9 0 -0.6 9.18 0 -0.8 9.73 0 -0.25
  [4,308,9.5,0,0,8.9,0,-0.6,9.18,0,-0.8,9.73,0,-0.25],
];
module ldraw_lib__s__3069bp1fs01(step=0, col=false, unit=2/5, alt=false, line=0.2, solid=!$preview)
    makepoly(ldraw_lib__s__3069bp1fs01(), step=step, col=col, unit=unit, alt=alt, line=line, solid=solid);
ldraw_lib__s__3069bp1fs01(line=0.2);
// main file
use <../lib.scad>
use <s/3069bp1fs01.scad>
use <s/3069bp1fs02.scad>
use <s/3069bs01.scad>
function ldraw_lib__3069bp1f() = [
// 0 Tile  1 x  2 with Silver Arched Window with Dark Brown Lattice and Dark Tan Arches Pattern
// 0 Name: 3069bp1f.dat
// 0 Author: Philippe Hurbain [Philo]
// 0 !LDRAW_ORG Part UPDATE 2025-07
// 0 !LICENSE Licensed under CC BY 4.0 : see CAreadme.txt
// 
// 0 BFC CERTIFY CCW
  [0,"BFC","CERTIFY"],
  [0,"BFC","CCW"],
// 
// 0 !KEYWORDS Bricklink 3069pb1190, Castle, Harry Potter, Hogwarts, HP
// 0 !KEYWORDS Rebrickable 3069bpr0392, Set 76419
// 
// 0 !HISTORY 2025-07-27 [OrionP] Official Update 2025-07
// 
// 1 16 0 0 0 1 0 0 0 1 0 0 0 1 s\3069bs01.dat
  [1,16,0,0,0,1,0,0,0,1,0,0,0,1, ldraw_lib__s__3069bs01()],
// 1 16 0 0 0 1 0 0 0 1 0 0 0 1 s\3069bp1fs02.dat
  [1,16,0,0,0,1,0,0,0,1,0,0,0,1, ldraw_lib__s__3069bp1fs02()],
// 1 16 0 0 0 1 0 0 0 1 0 0 0 -1 s\3069bp1fs02.dat
  [1,16,0,0,0,1,0,0,0,1,0,0,0,-1, ldraw_lib__s__3069bp1fs02()],
// 1 16 0 0 0 1 0 0 0 1 0 0 0 1 s\3069bp1fs01.dat
  [1,16,0,0,0,1,0,0,0,1,0,0,0,1, ldraw_lib__s__3069bp1fs01()],
// 1 16 -10.54 0 0 1 0 0 0 1 0 0 0 1 s\3069bp1fs01.dat
  [1,16,-10.54,0,0,1,0,0,0,1,0,0,0,1, ldraw_lib__s__3069bp1fs01()],
// 1 16 -21.12 0 0 1 0 0 0 1 0 0 0 1 s\3069bp1fs01.dat
  [1,16,-21.12,0,0,1,0,0,0,1,0,0,0,1, ldraw_lib__s__3069bp1fs01()],
// 
// 3 16 -19.59 0 0 -20 0 10 -20 0 -10
  [3,16,-19.59,0,0,-20,0,10,-20,0,-10],
// 4 16 20 0 10 19.55 0 9.62 19.55 0 -9.62 20 0 -10
  [4,16,20,0,10,19.55,0,9.62,19.55,0,-9.62,20,0,-10],
// 
// 3 80 -12.98 0 0 -12.22 0 -.6 -12.22 0 .6
  [3,80,-12.98,0,0,-12.22,0,-.6,-12.22,0,.6],
// 3 308 -2.9 0 .91 -2.9 0 -.91 -2.25 0 0
  [3,308,-2.9,0,.91,-2.9,0,-.91,-2.25,0,0],
// 3 80 -2.25 0 0 -1.64 0 -.6 -1.64 0 .6
  [3,80,-2.25,0,0,-1.64,0,-.6,-1.64,0,.6],
// 3 308 7.68 0 .91 7.68 0 -.91 8.3 0 0
  [3,308,7.68,0,.91,7.68,0,-.91,8.3,0,0],
// 3 80 8.3 0 0 8.9 0 -.6 8.9 0 .6
  [3,80,8.3,0,0,8.9,0,-.6,8.9,0,.6],
// 4 308 18.9 0 4.95 18.22 0 .91 18.22 0 -.91 18.9 0 -4.95
  [4,308,18.9,0,4.95,18.22,0,.91,18.22,0,-.91,18.9,0,-4.95],
// 4 28 19.55 0 9.62 18.9 0 4.95 18.9 0 -4.95 19.55 0 -9.62
  [4,28,19.55,0,9.62,18.9,0,4.95,18.9,0,-4.95,19.55,0,-9.62],
];
module ldraw_lib__3069bp1f(step=0, col=false, unit=2/5, alt=false, line=0.2, solid=!$preview)
    makepoly(ldraw_lib__3069bp1f(), step=step, col=col, unit=unit, alt=alt, line=line, solid=solid);
ldraw_lib__3069bp1f(line=0.2);
